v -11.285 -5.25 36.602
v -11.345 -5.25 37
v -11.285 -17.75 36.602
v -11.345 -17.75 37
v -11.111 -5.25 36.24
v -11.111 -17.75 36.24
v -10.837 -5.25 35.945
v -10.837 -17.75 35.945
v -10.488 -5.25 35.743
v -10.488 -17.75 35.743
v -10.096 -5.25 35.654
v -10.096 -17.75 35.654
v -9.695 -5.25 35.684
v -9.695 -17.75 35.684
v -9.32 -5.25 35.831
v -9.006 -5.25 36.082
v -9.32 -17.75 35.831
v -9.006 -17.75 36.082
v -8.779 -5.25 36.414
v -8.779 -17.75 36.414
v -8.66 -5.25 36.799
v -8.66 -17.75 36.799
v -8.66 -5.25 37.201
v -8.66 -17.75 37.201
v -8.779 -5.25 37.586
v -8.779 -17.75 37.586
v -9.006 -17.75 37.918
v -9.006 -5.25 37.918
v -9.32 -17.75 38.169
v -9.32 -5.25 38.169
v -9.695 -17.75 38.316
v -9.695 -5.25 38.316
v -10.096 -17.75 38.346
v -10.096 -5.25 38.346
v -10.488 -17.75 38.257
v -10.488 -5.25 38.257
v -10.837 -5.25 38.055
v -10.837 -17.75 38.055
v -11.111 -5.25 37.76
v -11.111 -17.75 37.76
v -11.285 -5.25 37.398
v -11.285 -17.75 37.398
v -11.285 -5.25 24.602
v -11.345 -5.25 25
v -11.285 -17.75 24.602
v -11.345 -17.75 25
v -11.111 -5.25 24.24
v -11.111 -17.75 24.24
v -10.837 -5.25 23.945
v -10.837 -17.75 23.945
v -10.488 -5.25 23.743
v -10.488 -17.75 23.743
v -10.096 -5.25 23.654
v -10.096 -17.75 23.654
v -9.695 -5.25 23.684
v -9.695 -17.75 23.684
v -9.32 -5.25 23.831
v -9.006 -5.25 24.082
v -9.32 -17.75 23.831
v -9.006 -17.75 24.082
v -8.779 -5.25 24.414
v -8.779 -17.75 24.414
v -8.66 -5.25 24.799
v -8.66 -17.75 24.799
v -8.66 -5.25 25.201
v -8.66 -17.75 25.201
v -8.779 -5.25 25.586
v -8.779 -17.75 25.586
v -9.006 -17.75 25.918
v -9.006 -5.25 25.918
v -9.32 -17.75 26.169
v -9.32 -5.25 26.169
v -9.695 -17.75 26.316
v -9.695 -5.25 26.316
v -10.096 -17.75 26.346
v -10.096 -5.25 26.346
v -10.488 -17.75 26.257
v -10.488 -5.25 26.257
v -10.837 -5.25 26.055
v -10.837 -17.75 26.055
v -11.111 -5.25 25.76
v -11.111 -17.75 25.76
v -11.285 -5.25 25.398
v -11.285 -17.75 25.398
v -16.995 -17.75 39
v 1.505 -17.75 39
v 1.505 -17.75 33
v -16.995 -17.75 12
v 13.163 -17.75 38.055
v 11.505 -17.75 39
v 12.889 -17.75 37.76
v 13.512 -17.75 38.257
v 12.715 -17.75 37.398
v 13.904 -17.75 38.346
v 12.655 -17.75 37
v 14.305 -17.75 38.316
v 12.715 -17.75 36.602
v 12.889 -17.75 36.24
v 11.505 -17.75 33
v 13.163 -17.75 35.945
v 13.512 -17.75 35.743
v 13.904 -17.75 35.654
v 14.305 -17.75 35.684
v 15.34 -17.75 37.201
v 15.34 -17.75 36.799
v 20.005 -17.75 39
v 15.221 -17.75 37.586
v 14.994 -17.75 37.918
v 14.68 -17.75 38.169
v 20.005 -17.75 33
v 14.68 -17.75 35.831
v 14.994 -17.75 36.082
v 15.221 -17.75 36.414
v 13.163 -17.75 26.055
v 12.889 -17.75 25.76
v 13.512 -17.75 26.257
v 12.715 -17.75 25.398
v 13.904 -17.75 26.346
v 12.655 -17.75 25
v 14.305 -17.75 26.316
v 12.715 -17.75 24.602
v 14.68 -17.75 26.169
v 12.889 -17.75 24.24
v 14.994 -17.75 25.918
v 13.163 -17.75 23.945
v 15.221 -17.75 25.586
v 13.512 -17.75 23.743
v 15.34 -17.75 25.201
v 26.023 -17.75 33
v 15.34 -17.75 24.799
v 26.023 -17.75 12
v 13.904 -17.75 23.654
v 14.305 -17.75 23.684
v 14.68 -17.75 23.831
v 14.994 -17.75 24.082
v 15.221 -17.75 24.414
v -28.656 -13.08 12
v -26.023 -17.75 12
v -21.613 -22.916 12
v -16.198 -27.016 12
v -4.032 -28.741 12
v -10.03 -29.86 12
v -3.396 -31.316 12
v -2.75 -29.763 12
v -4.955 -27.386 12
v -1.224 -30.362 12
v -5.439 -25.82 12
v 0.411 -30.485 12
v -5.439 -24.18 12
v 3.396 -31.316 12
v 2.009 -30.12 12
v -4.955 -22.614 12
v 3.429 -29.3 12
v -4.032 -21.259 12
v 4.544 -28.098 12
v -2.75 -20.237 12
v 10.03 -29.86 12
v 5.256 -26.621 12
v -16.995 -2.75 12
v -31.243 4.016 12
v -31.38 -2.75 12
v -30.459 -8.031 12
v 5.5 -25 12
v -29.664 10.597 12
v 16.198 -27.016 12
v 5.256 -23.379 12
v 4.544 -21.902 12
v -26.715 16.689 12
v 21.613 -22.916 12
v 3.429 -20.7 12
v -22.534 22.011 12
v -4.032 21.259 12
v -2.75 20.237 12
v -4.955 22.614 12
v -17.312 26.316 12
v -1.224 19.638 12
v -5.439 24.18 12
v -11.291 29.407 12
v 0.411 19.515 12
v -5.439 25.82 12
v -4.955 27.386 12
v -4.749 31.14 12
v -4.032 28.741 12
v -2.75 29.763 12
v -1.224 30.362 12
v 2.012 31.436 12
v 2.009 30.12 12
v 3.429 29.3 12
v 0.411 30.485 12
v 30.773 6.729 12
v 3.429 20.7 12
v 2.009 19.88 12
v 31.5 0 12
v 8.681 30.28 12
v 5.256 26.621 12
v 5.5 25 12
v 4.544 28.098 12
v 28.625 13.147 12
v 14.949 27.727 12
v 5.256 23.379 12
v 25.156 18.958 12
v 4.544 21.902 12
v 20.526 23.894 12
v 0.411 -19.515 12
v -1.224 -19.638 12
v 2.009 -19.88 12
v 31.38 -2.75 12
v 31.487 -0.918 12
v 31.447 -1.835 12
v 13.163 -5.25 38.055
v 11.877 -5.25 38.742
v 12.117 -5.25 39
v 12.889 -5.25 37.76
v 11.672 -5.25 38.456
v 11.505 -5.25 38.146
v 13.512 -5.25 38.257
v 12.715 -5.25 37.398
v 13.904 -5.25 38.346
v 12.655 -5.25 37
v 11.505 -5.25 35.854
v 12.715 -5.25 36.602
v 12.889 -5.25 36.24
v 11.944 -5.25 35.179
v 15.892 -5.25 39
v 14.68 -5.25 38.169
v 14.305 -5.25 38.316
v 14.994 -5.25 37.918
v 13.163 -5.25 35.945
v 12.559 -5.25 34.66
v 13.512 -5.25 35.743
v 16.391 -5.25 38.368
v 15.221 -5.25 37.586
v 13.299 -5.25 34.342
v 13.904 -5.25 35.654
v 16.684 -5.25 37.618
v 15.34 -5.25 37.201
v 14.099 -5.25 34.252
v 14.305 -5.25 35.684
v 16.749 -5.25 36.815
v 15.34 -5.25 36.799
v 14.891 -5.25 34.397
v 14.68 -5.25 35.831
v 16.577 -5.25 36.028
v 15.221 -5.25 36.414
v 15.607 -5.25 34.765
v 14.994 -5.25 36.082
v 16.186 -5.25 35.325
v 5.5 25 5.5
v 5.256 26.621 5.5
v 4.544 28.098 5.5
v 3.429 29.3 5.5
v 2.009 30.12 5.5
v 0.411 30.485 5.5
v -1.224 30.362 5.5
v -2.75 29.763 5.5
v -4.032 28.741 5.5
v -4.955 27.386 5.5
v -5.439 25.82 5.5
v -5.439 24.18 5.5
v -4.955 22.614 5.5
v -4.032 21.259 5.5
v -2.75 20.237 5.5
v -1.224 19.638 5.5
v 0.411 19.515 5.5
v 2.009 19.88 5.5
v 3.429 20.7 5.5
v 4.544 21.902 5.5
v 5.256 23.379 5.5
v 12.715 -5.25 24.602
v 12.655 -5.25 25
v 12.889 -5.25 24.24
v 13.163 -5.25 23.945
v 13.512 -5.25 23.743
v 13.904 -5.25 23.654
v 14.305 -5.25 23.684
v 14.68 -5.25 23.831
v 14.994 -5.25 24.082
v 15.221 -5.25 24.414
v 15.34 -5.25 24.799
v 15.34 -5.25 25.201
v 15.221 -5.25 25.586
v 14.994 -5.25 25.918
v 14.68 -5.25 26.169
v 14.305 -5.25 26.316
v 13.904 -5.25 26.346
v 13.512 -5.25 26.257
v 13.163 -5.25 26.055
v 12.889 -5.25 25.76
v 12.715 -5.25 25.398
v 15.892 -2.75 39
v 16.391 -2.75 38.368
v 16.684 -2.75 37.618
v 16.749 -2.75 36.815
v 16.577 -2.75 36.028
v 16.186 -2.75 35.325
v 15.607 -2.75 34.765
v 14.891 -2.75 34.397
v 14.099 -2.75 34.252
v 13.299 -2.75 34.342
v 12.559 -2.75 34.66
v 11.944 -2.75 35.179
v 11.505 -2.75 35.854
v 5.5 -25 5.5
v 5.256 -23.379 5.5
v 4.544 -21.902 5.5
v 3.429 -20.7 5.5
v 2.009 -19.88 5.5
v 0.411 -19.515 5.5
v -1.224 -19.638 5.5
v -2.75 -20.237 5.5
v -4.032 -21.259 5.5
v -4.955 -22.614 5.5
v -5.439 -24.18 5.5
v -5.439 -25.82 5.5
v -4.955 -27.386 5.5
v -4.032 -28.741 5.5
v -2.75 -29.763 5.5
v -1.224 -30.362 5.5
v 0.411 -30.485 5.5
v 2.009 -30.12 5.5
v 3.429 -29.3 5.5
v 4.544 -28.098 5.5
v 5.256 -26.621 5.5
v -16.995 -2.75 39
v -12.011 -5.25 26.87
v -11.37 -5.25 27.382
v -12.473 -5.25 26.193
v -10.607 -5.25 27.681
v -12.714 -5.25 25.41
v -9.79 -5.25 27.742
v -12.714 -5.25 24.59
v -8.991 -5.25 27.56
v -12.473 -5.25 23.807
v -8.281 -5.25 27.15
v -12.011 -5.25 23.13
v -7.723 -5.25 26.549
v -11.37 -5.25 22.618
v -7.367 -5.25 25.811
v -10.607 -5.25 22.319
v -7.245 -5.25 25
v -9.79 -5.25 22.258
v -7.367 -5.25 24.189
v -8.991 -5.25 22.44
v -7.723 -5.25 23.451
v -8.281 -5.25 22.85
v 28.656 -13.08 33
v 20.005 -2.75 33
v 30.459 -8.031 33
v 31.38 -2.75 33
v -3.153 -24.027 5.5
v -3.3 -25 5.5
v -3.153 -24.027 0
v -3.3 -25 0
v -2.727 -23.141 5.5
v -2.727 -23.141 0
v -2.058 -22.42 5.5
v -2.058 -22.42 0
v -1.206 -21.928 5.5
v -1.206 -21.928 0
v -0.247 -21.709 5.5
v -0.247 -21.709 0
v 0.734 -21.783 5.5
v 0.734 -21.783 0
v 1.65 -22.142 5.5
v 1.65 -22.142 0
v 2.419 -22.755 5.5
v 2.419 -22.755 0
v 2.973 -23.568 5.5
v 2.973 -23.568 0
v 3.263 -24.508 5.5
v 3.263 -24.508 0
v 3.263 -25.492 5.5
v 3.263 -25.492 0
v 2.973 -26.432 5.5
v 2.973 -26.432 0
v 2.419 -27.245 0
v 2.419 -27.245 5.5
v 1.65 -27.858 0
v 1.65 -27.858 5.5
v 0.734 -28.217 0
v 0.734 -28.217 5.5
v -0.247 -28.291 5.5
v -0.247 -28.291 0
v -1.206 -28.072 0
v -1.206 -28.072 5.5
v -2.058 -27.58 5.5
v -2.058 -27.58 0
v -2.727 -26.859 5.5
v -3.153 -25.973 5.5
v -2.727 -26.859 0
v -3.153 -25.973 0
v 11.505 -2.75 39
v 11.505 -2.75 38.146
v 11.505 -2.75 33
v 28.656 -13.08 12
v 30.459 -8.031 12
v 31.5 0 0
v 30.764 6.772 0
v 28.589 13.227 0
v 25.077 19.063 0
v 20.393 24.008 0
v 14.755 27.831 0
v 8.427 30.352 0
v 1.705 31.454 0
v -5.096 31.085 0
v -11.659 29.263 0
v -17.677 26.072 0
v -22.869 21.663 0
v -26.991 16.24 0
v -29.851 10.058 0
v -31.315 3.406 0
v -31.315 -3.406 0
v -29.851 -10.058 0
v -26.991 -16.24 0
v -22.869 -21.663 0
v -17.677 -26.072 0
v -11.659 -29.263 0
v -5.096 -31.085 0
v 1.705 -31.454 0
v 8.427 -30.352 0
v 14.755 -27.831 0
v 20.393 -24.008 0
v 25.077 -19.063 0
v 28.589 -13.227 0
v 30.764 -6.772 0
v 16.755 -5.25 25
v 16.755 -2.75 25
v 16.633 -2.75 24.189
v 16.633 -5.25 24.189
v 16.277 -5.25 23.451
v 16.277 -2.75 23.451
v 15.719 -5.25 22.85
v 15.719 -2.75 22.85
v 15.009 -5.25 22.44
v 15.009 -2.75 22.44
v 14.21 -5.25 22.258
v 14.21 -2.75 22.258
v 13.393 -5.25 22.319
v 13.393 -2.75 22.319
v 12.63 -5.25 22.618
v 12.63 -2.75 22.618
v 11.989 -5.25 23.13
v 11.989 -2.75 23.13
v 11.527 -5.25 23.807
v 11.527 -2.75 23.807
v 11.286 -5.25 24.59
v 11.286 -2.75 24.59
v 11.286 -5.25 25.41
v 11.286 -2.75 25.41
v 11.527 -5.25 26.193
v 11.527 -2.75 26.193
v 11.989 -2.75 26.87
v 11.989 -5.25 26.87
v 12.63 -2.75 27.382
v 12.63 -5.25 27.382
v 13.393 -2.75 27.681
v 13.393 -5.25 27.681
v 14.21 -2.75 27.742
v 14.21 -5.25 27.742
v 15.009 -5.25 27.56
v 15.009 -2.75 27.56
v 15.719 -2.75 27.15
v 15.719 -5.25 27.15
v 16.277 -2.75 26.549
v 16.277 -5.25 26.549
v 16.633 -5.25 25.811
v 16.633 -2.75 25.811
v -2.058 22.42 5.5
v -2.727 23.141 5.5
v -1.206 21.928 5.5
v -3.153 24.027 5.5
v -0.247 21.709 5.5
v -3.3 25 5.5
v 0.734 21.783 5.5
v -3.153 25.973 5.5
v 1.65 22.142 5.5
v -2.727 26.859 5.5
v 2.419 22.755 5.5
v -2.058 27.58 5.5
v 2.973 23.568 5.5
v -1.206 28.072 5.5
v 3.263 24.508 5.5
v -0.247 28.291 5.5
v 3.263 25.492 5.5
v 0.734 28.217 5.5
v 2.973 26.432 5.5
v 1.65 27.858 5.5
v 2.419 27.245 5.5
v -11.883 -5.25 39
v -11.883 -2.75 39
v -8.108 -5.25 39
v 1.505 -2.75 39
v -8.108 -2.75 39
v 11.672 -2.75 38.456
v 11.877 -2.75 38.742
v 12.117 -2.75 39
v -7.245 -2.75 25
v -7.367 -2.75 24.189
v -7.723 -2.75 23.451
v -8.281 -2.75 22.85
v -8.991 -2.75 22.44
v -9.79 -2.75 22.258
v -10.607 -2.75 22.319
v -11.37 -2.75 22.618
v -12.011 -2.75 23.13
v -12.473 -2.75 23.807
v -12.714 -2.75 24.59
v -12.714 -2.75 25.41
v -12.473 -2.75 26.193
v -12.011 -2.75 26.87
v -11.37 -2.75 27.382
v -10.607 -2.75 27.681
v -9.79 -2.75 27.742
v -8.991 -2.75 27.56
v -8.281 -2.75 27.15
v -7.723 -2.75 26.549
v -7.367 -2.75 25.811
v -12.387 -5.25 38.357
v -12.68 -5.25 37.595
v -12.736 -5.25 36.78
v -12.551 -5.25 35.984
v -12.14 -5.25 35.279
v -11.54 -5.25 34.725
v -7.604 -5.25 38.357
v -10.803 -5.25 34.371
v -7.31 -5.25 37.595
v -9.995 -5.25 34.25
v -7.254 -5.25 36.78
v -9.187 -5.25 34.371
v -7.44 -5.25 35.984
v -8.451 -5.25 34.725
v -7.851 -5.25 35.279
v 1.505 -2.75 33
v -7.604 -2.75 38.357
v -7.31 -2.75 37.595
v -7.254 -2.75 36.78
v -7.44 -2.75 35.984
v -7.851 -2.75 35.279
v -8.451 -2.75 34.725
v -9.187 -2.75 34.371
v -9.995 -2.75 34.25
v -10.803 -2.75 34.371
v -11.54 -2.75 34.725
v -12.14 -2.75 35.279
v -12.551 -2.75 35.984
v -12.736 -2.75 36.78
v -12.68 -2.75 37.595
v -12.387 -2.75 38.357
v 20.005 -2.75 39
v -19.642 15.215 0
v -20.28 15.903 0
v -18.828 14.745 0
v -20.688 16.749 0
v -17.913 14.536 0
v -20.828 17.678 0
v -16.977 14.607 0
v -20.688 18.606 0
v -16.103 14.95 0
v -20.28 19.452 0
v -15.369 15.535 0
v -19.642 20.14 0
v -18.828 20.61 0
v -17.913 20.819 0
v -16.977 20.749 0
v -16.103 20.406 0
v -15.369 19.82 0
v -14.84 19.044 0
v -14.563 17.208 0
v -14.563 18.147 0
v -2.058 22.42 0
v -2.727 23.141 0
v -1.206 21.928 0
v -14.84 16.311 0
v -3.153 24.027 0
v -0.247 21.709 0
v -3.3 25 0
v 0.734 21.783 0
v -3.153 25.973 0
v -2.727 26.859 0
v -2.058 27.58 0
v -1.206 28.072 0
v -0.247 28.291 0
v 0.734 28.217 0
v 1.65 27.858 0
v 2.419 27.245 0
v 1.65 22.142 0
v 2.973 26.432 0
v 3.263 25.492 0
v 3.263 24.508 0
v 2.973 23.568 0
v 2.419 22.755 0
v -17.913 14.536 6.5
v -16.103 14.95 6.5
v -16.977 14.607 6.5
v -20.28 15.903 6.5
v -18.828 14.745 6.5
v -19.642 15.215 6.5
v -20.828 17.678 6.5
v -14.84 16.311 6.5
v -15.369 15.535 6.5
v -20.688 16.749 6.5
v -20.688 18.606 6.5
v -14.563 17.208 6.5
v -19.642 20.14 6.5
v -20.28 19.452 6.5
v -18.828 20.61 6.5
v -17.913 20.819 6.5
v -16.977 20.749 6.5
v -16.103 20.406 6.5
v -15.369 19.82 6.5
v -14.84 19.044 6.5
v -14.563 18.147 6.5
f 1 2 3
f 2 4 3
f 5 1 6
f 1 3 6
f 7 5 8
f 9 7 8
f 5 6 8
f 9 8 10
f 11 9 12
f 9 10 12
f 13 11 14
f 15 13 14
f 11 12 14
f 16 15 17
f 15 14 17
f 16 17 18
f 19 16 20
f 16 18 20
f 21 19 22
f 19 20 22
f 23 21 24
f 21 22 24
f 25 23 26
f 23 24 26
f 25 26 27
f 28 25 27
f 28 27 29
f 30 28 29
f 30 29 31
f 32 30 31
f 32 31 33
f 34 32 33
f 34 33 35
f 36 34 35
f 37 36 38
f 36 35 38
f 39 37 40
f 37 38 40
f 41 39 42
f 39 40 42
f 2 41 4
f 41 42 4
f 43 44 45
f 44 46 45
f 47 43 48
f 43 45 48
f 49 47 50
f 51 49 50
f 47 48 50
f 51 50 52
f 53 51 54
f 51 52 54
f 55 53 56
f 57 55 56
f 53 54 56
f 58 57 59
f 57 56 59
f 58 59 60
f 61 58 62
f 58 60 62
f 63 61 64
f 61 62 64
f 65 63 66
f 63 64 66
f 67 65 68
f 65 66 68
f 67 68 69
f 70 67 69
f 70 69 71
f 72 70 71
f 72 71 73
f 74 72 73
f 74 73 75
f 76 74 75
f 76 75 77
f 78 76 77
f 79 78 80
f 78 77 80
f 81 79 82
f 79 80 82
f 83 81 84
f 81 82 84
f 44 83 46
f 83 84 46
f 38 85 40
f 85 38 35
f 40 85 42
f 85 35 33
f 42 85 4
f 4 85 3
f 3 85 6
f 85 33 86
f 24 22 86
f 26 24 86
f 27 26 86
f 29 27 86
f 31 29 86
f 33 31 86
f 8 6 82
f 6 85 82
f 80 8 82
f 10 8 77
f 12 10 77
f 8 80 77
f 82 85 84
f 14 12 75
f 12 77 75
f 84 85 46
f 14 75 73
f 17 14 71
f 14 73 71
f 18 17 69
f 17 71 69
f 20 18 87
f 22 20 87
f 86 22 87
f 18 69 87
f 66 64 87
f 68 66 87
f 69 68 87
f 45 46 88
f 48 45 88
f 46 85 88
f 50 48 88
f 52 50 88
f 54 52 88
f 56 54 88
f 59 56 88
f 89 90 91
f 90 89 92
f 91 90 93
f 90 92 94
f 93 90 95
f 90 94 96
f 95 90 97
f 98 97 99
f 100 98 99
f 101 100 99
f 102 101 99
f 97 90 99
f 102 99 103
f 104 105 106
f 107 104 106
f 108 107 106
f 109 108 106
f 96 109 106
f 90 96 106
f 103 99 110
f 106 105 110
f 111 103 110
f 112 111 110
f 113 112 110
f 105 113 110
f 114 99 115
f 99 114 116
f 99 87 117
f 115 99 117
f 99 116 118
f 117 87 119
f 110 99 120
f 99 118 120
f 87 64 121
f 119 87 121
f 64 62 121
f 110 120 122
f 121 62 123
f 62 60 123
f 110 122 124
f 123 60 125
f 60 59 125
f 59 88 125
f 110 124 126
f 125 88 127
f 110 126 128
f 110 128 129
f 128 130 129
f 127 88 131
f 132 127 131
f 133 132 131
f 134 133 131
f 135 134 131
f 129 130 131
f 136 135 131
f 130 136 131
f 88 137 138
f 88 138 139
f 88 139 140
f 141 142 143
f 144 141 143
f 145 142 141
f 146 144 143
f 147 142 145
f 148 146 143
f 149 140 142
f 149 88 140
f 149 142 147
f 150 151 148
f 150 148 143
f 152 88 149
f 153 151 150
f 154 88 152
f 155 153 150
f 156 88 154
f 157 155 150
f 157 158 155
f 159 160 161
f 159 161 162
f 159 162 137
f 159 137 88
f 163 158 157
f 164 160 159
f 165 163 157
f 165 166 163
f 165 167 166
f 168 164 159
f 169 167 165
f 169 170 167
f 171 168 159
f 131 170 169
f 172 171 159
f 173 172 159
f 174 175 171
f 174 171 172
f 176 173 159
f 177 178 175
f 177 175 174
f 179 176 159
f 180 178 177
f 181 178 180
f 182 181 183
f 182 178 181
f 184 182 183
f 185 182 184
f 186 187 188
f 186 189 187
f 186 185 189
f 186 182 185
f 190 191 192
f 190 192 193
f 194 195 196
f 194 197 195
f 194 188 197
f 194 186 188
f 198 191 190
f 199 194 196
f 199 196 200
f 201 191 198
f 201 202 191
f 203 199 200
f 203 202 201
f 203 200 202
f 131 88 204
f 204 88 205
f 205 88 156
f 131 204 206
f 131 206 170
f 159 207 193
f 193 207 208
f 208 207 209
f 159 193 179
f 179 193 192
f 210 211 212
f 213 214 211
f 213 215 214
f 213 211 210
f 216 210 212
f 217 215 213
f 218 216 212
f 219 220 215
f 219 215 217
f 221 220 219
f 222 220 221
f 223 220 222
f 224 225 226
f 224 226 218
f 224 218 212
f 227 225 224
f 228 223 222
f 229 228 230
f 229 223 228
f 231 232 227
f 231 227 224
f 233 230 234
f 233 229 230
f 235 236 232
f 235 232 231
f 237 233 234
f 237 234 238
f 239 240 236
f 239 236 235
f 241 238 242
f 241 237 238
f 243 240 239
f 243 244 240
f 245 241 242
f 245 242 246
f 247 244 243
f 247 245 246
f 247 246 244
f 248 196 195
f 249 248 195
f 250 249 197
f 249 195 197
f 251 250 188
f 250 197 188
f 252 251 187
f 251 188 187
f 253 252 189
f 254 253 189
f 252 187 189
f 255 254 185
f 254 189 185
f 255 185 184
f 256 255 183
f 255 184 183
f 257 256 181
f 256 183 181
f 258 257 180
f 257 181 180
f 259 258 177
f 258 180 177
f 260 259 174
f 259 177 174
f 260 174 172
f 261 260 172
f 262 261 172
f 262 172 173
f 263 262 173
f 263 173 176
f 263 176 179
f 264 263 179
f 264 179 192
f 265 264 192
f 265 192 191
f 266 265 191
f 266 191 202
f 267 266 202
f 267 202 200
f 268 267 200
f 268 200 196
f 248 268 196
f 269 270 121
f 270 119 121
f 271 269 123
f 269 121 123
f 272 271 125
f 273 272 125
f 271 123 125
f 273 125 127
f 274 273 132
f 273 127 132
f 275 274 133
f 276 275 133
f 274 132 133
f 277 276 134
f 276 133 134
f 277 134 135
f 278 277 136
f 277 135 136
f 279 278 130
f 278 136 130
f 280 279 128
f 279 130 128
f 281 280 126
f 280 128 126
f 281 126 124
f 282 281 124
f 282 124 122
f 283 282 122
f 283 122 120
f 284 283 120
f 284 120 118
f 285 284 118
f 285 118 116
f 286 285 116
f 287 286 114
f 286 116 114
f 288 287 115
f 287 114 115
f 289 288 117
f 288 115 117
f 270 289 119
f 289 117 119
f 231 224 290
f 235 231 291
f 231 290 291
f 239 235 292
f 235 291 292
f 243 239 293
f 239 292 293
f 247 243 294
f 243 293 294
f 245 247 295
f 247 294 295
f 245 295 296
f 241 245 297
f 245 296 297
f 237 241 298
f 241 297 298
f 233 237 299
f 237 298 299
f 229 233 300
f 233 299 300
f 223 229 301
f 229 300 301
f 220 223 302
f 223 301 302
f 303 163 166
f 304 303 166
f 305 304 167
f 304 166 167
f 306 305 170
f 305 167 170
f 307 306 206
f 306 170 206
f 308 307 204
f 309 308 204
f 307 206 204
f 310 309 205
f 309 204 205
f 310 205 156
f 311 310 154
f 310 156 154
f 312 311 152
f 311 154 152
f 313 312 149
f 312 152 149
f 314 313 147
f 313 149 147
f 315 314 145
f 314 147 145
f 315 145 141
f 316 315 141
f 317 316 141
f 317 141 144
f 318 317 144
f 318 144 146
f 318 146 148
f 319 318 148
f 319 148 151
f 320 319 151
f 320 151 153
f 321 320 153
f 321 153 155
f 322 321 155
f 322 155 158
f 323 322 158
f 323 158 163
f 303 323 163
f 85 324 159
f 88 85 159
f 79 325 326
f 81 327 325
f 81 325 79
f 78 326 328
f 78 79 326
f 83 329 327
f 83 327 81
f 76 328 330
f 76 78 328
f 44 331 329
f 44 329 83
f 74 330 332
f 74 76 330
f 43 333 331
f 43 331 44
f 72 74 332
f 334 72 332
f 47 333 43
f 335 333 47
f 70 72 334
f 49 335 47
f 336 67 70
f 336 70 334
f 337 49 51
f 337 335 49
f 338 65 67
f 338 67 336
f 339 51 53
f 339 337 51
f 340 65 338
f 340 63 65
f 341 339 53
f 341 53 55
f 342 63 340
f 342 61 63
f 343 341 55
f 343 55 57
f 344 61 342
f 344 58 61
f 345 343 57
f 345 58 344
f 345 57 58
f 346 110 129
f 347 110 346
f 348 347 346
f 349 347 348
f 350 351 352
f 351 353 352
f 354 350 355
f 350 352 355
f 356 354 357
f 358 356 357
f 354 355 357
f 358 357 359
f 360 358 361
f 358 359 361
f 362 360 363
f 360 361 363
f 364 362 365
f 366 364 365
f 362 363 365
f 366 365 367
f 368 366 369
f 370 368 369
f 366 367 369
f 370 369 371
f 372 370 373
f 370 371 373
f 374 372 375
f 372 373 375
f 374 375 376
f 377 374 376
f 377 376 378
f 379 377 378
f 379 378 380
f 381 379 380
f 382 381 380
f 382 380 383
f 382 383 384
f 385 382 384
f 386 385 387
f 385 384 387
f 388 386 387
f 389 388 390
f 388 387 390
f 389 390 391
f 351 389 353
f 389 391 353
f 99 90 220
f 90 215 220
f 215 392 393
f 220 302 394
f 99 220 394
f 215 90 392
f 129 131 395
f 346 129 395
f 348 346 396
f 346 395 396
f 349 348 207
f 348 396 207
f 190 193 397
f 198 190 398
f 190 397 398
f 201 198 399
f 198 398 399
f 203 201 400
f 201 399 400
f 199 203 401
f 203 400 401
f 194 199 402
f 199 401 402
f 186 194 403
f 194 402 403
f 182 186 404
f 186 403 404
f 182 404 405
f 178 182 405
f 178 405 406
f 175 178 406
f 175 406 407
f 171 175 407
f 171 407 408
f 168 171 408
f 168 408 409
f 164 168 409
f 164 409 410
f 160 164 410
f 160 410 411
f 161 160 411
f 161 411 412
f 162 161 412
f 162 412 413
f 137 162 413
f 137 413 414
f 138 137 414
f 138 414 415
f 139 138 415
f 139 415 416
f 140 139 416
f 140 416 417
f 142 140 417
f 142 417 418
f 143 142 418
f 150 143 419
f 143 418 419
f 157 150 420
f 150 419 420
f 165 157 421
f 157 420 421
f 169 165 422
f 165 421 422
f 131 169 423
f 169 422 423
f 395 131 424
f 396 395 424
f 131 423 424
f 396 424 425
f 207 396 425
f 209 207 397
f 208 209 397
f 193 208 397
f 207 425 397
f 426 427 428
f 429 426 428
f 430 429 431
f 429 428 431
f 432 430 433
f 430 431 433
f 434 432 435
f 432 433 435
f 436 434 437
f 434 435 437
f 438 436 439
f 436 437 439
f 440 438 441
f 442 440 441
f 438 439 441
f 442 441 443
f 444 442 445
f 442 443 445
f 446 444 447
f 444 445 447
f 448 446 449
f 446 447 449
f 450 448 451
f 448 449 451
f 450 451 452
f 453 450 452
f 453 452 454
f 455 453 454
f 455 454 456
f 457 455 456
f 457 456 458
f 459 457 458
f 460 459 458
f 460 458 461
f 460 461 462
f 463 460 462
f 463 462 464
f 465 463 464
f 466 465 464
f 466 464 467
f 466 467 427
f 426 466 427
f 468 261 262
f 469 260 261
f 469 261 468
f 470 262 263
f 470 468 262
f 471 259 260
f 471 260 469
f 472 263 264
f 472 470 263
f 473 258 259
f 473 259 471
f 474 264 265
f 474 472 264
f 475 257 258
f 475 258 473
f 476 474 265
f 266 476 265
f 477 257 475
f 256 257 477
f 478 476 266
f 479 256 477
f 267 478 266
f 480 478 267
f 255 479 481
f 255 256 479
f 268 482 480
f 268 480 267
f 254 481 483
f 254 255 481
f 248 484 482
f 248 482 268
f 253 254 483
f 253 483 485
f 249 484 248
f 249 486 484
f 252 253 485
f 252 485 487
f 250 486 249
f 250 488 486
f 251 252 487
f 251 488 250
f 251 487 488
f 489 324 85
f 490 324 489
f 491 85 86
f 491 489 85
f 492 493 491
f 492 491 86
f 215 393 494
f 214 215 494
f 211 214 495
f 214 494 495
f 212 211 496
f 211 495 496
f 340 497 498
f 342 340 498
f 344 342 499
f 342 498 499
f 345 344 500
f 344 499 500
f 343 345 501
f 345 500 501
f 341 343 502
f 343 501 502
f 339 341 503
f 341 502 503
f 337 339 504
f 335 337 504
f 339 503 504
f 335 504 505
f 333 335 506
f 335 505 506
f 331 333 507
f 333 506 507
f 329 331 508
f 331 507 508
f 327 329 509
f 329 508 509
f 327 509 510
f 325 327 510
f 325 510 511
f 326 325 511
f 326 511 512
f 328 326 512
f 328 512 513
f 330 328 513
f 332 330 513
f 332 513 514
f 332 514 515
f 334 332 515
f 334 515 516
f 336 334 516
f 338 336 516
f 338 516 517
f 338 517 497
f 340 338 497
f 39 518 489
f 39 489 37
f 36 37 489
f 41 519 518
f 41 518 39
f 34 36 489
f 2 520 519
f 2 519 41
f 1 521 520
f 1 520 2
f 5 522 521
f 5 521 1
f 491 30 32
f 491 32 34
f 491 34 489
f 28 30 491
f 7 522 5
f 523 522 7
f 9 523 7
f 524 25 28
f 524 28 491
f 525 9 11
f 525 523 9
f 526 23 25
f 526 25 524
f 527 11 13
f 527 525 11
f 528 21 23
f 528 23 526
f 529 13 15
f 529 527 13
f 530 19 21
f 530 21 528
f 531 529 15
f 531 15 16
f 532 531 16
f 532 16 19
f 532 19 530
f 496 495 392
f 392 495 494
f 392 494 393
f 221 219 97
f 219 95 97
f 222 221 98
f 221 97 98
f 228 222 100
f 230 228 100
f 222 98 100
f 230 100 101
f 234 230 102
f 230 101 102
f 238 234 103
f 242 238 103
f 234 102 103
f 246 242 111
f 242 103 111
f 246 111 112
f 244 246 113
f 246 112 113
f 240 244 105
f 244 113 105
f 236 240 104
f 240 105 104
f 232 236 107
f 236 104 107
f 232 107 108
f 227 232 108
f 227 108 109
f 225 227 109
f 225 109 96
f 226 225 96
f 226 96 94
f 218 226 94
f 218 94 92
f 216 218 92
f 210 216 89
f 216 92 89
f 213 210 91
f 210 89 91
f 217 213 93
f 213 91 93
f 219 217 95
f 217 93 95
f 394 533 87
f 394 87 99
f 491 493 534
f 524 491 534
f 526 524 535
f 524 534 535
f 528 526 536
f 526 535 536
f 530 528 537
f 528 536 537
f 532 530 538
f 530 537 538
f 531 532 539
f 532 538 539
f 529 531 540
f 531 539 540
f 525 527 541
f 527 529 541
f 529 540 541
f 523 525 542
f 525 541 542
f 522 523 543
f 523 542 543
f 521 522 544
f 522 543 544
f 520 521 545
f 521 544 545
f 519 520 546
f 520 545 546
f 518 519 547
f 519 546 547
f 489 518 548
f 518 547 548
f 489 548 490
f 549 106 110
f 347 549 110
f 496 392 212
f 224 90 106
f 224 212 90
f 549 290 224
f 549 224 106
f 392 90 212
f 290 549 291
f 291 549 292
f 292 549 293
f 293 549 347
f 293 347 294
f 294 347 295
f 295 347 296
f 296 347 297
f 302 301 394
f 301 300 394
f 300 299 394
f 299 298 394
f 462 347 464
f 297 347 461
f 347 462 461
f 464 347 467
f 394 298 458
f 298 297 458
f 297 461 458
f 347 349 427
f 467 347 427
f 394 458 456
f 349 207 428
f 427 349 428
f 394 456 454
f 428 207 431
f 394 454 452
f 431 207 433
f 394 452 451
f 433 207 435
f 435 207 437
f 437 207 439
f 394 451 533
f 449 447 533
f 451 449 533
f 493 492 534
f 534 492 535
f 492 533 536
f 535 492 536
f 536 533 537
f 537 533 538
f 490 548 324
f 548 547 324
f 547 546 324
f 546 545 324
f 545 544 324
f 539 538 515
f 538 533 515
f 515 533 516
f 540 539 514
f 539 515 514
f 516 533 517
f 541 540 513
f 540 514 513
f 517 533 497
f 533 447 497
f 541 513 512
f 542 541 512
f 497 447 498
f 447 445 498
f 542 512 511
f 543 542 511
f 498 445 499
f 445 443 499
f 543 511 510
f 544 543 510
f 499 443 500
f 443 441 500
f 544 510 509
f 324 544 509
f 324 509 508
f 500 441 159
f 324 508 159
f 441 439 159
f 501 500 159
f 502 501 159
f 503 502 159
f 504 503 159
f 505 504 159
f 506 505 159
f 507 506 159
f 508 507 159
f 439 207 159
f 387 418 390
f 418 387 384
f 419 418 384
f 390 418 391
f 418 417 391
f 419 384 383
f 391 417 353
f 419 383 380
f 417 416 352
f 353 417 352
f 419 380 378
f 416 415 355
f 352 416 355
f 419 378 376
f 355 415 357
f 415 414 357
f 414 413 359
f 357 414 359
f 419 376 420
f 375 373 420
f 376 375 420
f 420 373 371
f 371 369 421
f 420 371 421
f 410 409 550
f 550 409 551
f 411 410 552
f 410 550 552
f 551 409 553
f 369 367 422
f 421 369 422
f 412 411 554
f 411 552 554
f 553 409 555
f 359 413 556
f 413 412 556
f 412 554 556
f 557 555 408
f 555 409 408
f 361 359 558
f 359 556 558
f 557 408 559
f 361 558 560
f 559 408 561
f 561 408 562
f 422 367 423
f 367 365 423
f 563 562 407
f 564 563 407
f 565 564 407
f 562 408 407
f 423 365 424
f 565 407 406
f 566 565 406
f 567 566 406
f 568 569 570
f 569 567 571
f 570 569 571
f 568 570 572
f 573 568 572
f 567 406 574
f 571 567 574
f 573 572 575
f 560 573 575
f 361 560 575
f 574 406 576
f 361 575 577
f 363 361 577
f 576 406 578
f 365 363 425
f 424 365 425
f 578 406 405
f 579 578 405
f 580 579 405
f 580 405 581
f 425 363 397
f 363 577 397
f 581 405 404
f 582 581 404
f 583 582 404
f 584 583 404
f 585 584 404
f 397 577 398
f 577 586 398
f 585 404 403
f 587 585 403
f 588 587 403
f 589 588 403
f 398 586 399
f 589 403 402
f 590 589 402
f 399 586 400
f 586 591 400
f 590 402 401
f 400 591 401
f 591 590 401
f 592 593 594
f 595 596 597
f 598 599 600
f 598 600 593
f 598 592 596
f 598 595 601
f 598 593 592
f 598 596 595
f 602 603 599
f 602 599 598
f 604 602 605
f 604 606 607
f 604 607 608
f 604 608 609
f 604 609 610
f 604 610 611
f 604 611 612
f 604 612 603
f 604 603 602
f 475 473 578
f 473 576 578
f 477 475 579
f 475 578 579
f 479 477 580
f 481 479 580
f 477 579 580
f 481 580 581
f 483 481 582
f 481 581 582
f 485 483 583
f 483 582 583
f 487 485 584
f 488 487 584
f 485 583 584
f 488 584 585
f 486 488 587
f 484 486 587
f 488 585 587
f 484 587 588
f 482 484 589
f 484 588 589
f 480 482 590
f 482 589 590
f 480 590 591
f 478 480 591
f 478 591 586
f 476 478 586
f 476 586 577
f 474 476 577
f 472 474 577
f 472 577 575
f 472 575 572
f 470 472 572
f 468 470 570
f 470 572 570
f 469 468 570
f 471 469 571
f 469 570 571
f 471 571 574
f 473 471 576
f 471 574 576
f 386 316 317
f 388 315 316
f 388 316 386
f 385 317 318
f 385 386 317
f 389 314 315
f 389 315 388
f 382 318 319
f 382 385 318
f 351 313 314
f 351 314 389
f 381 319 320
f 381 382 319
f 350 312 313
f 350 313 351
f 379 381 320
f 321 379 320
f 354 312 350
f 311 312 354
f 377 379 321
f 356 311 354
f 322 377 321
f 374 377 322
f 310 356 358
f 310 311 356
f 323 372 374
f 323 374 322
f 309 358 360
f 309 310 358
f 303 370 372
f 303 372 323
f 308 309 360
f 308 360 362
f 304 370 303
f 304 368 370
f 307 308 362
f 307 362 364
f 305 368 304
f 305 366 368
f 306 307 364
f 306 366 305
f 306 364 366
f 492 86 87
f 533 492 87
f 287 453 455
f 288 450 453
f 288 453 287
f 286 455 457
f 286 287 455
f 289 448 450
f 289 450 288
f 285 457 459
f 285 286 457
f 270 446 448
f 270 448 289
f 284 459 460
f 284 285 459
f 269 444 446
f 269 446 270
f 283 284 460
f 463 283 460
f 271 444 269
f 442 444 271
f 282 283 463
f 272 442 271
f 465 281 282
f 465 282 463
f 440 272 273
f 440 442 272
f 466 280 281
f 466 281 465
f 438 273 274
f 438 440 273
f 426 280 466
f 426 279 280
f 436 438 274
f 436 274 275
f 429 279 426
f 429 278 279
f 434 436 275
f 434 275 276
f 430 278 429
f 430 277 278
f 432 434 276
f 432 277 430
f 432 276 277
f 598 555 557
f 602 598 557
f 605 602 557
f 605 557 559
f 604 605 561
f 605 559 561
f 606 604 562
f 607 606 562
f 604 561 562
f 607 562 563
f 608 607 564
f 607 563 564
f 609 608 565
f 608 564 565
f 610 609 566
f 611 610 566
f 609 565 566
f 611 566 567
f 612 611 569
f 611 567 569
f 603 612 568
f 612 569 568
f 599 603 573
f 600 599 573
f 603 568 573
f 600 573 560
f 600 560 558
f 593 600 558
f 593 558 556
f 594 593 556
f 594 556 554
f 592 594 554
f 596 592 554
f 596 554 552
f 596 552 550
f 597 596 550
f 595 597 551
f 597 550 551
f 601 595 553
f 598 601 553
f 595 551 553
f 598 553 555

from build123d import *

# Parameters (mm, degrees)
SKETCH2_R                        = 31.5
BOSS_EXTRUDE1_DEPTH              = 12
CBORE_FOR_M6_SHCS1_D             = 6.6
CBORE_FOR_M6_SHCS1_CBORE_D       = 11
CBORE_FOR_M6_SHCS1_CBORE_DEPTH   = 6.5
SKETCH5_R                        = 3.15
CUT_EXTRUDE1_DEPTH               = 6.5
BOSS_EXTRUDE2_DEPTH              = 27
CBORE_FOR_M2_5_SHCS1_D           = 2.7
CBORE_FOR_M2_5_SHCS1_CBORE_D     = 5.5
CBORE_FOR_M2_5_SHCS1_CBORE_DEPTH = 2.5
SKETCH9_W                        = 14.384523908
SKETCH9_H                        = 27
SKETCH9_W_2                      = 10
SKETCH9_H_2                      = 6
SKETCH9_W_3                      = 11.37493753
CUT_EXTRUDE2_DEPTH               = 15


with BuildPart() as part:
    # Sketch2 → Boss-Extrude1 (new body)
    with BuildSketch(Plane.XY):
        Circle(SKETCH2_R)
    extrude(amount=BOSS_EXTRUDE1_DEPTH)

    # CBORE for M6 SHCS1 (through all)
    with Locations(Plane.XY.offset(12)):
        with Locations((0, 25), (0, -25)):
            CounterBoreHole(CBORE_FOR_M6_SHCS1_D / 2, CBORE_FOR_M6_SHCS1_CBORE_D / 2, CBORE_FOR_M6_SHCS1_CBORE_DEPTH)

    # Sketch5 → Cut-Extrude1 (cut)
    with BuildSketch(Plane(origin=(0, 0, 0), x_dir=(-1, 0, 0), z_dir=(0, 0, -1))):
        with Locations((17.67766953, 17.67766953)):
            Circle(SKETCH5_R)
    extrude(amount=-CUT_EXTRUDE1_DEPTH, mode=Mode.SUBTRACT)

    # Sketch6 → Boss-Extrude2 (add)
    with BuildSketch(Plane(origin=(0, 0, 12), x_dir=(-1, 0, 0), z_dir=(0, 0, -1))):
        with BuildLine():
            Line((-31.379730719, -2.75), (31.379730719, -2.75))
            ThreePointArc((31.379730719, -2.75), (29.665019709, -10.594177913), (26.022826518, -17.75))
            Line((26.022826518, -17.75), (-26.022826518, -17.75))
            ThreePointArc((-26.022826518, -17.75), (-29.665019709, -10.594177913), (-31.379730719, -2.75))
        make_face()
    extrude(amount=-BOSS_EXTRUDE2_DEPTH)

    # CBORE for M2.5 SHCS1 (through all)
    with Locations(Plane(origin=(0, -2.75, 0), x_dir=(1, 0, 0), z_dir=(0, 1, 0))):
        with Locations((-9.995206811, -25), (14.004793189, -37), (-9.995206811, -37), (14.004793189, -25)):
            CounterBoreHole(CBORE_FOR_M2_5_SHCS1_D / 2, CBORE_FOR_M2_5_SHCS1_CBORE_D / 2, CBORE_FOR_M2_5_SHCS1_CBORE_DEPTH)

    # Sketch9 → Cut-Extrude2 (cut)
    with BuildSketch(Plane(origin=(0, -2.75, 0), x_dir=(1, 0, 0), z_dir=(0, 1, 0))):
        with Locations((-24.187468765, -25.5)):
            Rectangle(SKETCH9_W, SKETCH9_H)
        with Locations((6.504793189, -36)):
            Rectangle(SKETCH9_W_2, SKETCH9_H_2)
        with Locations((25.692261954, -36)):
            Rectangle(SKETCH9_W_3, SKETCH9_H_2)
    extrude(amount=-CUT_EXTRUDE2_DEPTH, mode=Mode.SUBTRACT)


solid = part.part
